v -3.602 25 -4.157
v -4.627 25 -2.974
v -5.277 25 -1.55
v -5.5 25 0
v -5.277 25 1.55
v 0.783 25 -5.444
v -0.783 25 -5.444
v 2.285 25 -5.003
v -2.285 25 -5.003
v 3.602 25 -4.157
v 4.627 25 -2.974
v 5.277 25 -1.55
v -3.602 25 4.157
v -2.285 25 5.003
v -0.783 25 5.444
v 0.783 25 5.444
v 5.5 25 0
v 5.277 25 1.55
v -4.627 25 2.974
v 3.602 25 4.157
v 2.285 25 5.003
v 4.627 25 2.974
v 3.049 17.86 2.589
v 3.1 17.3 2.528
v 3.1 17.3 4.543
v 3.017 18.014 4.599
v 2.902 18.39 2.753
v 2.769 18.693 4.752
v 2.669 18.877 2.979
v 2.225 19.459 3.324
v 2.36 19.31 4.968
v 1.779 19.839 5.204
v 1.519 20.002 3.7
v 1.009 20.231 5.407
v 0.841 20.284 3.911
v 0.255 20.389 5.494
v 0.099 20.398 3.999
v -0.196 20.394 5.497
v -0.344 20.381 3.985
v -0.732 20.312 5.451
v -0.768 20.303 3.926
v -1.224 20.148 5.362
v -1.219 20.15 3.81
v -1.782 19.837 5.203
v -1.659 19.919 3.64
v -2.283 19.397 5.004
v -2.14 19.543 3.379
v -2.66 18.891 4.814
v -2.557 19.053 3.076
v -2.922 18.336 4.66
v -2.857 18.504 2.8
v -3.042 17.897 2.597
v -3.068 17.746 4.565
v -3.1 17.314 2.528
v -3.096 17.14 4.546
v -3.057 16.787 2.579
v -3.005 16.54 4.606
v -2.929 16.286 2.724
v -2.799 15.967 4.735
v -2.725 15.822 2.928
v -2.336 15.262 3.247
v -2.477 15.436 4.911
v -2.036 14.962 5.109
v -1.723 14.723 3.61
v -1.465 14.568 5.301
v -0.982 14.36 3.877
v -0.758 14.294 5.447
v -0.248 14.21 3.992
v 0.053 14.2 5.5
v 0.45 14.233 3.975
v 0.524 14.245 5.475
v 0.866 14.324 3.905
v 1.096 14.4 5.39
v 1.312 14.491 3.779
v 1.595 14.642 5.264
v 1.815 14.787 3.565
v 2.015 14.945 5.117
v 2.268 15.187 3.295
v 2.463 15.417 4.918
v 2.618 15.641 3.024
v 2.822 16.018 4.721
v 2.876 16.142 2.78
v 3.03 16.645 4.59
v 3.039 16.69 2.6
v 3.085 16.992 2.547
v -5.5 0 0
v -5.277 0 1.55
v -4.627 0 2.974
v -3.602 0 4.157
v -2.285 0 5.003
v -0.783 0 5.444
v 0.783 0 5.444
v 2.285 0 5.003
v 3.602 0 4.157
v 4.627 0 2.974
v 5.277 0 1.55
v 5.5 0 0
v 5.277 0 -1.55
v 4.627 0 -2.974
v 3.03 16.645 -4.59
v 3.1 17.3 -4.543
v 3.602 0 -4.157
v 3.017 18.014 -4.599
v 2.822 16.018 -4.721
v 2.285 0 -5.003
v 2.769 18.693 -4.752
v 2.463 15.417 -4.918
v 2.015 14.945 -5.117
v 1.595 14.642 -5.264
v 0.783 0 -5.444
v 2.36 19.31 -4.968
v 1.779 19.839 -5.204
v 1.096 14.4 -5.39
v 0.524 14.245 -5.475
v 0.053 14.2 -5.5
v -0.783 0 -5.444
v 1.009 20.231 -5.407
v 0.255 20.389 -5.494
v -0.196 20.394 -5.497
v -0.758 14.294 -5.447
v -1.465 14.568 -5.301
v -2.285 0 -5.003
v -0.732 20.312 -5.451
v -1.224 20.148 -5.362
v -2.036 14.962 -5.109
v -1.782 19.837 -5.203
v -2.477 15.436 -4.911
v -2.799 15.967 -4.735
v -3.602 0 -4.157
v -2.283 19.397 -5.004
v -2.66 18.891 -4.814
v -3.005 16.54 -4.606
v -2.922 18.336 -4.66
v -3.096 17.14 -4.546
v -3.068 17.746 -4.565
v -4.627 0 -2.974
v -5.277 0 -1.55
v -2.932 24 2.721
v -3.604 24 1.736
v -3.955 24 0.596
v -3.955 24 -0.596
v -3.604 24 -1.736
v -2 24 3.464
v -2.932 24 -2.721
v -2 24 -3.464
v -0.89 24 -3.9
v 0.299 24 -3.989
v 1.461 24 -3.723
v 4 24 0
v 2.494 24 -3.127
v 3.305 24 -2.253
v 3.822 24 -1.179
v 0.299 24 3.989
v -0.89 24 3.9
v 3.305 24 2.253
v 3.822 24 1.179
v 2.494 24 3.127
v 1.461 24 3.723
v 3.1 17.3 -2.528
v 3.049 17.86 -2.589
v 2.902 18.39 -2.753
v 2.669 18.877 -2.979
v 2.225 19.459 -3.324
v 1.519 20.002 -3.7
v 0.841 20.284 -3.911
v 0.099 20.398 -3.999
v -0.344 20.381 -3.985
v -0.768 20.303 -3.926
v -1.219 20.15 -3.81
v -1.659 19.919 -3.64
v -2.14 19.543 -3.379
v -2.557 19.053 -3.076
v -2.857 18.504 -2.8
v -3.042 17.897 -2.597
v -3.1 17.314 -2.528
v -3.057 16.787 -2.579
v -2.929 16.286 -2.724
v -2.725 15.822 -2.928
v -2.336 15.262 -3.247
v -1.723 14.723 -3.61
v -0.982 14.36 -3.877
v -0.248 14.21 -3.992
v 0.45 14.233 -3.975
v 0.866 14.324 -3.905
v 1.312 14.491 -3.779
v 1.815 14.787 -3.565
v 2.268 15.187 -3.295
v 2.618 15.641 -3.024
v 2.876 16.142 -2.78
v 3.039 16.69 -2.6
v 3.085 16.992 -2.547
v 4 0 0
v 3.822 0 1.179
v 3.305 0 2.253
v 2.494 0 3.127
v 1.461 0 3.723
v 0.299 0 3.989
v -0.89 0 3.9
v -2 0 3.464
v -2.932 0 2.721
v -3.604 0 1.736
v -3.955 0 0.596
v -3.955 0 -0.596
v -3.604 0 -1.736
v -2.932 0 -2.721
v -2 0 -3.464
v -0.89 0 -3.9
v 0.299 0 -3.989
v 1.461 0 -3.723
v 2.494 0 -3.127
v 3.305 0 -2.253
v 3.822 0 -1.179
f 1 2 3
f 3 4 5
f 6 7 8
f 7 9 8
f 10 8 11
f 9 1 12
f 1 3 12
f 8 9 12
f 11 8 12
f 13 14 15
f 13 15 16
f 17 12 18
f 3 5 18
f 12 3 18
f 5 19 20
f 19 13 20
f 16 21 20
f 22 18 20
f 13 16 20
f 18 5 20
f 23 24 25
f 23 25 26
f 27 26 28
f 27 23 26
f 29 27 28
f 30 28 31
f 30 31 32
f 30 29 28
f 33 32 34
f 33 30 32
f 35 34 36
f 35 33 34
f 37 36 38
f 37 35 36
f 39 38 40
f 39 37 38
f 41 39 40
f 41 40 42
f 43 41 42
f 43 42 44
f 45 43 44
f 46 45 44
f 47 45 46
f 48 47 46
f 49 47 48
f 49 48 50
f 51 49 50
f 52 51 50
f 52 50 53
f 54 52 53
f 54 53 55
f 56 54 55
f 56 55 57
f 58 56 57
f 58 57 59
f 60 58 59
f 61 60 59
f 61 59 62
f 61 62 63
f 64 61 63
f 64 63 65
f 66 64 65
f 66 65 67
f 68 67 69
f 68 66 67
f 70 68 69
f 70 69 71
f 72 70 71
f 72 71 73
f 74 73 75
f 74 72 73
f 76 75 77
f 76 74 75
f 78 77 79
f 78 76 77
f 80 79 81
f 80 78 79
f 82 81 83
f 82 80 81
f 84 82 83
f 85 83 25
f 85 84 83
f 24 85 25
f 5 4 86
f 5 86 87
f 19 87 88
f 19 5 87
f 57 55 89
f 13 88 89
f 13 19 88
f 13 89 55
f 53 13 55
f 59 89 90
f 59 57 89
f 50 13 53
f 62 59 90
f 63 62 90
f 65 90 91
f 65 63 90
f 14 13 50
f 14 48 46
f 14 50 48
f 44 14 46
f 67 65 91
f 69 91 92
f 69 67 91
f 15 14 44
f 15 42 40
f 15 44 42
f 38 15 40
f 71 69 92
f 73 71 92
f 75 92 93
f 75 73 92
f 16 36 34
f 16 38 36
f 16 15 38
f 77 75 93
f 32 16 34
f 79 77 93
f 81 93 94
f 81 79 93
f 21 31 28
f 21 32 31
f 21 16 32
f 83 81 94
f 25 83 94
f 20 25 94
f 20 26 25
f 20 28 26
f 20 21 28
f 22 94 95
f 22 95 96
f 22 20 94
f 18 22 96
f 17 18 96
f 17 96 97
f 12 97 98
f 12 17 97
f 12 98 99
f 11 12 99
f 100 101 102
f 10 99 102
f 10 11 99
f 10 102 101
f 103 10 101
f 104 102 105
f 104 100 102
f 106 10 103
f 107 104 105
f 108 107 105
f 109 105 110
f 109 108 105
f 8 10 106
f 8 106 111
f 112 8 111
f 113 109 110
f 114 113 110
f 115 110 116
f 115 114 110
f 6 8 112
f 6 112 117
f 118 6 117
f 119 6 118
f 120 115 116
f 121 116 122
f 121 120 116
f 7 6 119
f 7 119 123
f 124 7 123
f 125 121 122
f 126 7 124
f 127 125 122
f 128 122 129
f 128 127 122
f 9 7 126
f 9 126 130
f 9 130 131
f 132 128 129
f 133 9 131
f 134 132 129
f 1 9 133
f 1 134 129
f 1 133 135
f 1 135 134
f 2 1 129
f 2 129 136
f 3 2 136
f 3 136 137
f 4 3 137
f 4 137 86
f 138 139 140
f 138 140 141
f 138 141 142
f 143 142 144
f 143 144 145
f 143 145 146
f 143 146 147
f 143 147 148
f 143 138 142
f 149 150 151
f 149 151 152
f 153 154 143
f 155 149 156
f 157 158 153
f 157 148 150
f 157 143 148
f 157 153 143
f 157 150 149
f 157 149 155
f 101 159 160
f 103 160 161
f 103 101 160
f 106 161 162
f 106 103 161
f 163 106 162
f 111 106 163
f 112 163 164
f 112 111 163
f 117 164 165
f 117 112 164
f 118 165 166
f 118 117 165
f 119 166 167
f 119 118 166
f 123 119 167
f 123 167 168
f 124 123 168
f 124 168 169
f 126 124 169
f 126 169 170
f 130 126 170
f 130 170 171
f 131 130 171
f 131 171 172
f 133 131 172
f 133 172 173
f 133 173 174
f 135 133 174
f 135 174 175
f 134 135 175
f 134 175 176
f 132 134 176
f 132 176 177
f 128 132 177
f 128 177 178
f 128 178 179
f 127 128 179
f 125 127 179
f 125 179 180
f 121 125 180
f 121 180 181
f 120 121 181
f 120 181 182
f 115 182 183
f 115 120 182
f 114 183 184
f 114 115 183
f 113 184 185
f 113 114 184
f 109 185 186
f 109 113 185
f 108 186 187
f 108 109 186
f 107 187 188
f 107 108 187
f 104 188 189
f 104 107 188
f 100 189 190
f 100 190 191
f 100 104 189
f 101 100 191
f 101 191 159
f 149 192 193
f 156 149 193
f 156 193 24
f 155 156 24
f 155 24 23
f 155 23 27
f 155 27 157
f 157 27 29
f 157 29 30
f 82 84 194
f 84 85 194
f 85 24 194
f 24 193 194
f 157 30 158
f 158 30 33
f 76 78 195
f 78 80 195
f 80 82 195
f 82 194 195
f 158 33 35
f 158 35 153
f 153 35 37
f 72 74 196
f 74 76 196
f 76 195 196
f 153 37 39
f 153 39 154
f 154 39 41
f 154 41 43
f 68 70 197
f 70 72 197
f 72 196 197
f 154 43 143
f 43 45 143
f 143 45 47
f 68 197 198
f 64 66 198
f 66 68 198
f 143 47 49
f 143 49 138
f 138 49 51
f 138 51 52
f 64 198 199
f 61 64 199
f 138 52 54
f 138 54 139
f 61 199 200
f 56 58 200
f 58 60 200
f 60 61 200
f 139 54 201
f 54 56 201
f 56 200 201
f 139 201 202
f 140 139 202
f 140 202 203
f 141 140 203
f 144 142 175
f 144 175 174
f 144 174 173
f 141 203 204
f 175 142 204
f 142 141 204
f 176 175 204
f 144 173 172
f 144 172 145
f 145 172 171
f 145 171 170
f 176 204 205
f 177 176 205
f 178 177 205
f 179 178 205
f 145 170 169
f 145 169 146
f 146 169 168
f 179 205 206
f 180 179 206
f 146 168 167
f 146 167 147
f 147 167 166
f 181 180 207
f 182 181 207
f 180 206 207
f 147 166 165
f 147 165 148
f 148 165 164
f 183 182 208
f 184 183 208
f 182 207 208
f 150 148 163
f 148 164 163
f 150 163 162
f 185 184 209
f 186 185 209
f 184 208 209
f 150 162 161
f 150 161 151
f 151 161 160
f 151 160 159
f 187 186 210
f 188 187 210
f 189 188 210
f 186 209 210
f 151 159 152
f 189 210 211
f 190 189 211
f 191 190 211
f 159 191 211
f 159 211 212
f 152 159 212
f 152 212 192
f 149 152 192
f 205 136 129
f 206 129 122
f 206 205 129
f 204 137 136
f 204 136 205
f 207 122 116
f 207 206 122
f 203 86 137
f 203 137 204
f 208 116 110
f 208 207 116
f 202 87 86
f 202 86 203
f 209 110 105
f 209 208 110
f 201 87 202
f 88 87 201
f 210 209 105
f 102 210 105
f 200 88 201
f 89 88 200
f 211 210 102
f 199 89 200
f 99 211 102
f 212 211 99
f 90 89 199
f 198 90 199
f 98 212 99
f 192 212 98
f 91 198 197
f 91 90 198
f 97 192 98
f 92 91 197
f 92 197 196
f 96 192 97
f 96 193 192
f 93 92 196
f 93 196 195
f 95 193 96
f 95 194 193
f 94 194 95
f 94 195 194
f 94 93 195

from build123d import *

# Parameters (mm, degrees)
SKETCH_1_W               = 5.5
SKETCH_1_H               = 25
CUT_EXTRUDE_1_DEPTH      = 27.182054923
CUT_EXTRUDE_1_DEPTH_BACK = 27.182054923
SKETCH_3_R               = 3.1
SKETCH_4_R               = 4
CUT_EXTRUDE_2_DEPTH      = 24


with BuildPart() as part:
    # 草图1 → 旋转1 (revolve)
    with BuildSketch(Plane.XY, mode=Mode.PRIVATE) as revolve_1_sk:
        with Locations((2.75, 12.5)):
            Rectangle(SKETCH_1_W, SKETCH_1_H)
    revolve(revolve_1_sk.sketch.rotate(Axis((0, 25, 0), (0, 1, 0)), 180), axis=Axis((0, 25, 0), (0, 1, 0)))

    # 草图3 → 切除-拉伸1 (cut, two sides: drawn at the far end of the back side and taken through both)
    with BuildSketch(Plane.XY.offset(-CUT_EXTRUDE_1_DEPTH_BACK)):
        with Locations((0, 17.3)):
            Circle(SKETCH_3_R)
    extrude(amount=CUT_EXTRUDE_1_DEPTH + CUT_EXTRUDE_1_DEPTH_BACK, mode=Mode.SUBTRACT)

    # 草图4 → 切除-拉伸2 (cut)
    with BuildSketch(Plane.XZ):
        Circle(SKETCH_4_R)
    extrude(amount=-CUT_EXTRUDE_2_DEPTH, mode=Mode.SUBTRACT)


solid = part.part
